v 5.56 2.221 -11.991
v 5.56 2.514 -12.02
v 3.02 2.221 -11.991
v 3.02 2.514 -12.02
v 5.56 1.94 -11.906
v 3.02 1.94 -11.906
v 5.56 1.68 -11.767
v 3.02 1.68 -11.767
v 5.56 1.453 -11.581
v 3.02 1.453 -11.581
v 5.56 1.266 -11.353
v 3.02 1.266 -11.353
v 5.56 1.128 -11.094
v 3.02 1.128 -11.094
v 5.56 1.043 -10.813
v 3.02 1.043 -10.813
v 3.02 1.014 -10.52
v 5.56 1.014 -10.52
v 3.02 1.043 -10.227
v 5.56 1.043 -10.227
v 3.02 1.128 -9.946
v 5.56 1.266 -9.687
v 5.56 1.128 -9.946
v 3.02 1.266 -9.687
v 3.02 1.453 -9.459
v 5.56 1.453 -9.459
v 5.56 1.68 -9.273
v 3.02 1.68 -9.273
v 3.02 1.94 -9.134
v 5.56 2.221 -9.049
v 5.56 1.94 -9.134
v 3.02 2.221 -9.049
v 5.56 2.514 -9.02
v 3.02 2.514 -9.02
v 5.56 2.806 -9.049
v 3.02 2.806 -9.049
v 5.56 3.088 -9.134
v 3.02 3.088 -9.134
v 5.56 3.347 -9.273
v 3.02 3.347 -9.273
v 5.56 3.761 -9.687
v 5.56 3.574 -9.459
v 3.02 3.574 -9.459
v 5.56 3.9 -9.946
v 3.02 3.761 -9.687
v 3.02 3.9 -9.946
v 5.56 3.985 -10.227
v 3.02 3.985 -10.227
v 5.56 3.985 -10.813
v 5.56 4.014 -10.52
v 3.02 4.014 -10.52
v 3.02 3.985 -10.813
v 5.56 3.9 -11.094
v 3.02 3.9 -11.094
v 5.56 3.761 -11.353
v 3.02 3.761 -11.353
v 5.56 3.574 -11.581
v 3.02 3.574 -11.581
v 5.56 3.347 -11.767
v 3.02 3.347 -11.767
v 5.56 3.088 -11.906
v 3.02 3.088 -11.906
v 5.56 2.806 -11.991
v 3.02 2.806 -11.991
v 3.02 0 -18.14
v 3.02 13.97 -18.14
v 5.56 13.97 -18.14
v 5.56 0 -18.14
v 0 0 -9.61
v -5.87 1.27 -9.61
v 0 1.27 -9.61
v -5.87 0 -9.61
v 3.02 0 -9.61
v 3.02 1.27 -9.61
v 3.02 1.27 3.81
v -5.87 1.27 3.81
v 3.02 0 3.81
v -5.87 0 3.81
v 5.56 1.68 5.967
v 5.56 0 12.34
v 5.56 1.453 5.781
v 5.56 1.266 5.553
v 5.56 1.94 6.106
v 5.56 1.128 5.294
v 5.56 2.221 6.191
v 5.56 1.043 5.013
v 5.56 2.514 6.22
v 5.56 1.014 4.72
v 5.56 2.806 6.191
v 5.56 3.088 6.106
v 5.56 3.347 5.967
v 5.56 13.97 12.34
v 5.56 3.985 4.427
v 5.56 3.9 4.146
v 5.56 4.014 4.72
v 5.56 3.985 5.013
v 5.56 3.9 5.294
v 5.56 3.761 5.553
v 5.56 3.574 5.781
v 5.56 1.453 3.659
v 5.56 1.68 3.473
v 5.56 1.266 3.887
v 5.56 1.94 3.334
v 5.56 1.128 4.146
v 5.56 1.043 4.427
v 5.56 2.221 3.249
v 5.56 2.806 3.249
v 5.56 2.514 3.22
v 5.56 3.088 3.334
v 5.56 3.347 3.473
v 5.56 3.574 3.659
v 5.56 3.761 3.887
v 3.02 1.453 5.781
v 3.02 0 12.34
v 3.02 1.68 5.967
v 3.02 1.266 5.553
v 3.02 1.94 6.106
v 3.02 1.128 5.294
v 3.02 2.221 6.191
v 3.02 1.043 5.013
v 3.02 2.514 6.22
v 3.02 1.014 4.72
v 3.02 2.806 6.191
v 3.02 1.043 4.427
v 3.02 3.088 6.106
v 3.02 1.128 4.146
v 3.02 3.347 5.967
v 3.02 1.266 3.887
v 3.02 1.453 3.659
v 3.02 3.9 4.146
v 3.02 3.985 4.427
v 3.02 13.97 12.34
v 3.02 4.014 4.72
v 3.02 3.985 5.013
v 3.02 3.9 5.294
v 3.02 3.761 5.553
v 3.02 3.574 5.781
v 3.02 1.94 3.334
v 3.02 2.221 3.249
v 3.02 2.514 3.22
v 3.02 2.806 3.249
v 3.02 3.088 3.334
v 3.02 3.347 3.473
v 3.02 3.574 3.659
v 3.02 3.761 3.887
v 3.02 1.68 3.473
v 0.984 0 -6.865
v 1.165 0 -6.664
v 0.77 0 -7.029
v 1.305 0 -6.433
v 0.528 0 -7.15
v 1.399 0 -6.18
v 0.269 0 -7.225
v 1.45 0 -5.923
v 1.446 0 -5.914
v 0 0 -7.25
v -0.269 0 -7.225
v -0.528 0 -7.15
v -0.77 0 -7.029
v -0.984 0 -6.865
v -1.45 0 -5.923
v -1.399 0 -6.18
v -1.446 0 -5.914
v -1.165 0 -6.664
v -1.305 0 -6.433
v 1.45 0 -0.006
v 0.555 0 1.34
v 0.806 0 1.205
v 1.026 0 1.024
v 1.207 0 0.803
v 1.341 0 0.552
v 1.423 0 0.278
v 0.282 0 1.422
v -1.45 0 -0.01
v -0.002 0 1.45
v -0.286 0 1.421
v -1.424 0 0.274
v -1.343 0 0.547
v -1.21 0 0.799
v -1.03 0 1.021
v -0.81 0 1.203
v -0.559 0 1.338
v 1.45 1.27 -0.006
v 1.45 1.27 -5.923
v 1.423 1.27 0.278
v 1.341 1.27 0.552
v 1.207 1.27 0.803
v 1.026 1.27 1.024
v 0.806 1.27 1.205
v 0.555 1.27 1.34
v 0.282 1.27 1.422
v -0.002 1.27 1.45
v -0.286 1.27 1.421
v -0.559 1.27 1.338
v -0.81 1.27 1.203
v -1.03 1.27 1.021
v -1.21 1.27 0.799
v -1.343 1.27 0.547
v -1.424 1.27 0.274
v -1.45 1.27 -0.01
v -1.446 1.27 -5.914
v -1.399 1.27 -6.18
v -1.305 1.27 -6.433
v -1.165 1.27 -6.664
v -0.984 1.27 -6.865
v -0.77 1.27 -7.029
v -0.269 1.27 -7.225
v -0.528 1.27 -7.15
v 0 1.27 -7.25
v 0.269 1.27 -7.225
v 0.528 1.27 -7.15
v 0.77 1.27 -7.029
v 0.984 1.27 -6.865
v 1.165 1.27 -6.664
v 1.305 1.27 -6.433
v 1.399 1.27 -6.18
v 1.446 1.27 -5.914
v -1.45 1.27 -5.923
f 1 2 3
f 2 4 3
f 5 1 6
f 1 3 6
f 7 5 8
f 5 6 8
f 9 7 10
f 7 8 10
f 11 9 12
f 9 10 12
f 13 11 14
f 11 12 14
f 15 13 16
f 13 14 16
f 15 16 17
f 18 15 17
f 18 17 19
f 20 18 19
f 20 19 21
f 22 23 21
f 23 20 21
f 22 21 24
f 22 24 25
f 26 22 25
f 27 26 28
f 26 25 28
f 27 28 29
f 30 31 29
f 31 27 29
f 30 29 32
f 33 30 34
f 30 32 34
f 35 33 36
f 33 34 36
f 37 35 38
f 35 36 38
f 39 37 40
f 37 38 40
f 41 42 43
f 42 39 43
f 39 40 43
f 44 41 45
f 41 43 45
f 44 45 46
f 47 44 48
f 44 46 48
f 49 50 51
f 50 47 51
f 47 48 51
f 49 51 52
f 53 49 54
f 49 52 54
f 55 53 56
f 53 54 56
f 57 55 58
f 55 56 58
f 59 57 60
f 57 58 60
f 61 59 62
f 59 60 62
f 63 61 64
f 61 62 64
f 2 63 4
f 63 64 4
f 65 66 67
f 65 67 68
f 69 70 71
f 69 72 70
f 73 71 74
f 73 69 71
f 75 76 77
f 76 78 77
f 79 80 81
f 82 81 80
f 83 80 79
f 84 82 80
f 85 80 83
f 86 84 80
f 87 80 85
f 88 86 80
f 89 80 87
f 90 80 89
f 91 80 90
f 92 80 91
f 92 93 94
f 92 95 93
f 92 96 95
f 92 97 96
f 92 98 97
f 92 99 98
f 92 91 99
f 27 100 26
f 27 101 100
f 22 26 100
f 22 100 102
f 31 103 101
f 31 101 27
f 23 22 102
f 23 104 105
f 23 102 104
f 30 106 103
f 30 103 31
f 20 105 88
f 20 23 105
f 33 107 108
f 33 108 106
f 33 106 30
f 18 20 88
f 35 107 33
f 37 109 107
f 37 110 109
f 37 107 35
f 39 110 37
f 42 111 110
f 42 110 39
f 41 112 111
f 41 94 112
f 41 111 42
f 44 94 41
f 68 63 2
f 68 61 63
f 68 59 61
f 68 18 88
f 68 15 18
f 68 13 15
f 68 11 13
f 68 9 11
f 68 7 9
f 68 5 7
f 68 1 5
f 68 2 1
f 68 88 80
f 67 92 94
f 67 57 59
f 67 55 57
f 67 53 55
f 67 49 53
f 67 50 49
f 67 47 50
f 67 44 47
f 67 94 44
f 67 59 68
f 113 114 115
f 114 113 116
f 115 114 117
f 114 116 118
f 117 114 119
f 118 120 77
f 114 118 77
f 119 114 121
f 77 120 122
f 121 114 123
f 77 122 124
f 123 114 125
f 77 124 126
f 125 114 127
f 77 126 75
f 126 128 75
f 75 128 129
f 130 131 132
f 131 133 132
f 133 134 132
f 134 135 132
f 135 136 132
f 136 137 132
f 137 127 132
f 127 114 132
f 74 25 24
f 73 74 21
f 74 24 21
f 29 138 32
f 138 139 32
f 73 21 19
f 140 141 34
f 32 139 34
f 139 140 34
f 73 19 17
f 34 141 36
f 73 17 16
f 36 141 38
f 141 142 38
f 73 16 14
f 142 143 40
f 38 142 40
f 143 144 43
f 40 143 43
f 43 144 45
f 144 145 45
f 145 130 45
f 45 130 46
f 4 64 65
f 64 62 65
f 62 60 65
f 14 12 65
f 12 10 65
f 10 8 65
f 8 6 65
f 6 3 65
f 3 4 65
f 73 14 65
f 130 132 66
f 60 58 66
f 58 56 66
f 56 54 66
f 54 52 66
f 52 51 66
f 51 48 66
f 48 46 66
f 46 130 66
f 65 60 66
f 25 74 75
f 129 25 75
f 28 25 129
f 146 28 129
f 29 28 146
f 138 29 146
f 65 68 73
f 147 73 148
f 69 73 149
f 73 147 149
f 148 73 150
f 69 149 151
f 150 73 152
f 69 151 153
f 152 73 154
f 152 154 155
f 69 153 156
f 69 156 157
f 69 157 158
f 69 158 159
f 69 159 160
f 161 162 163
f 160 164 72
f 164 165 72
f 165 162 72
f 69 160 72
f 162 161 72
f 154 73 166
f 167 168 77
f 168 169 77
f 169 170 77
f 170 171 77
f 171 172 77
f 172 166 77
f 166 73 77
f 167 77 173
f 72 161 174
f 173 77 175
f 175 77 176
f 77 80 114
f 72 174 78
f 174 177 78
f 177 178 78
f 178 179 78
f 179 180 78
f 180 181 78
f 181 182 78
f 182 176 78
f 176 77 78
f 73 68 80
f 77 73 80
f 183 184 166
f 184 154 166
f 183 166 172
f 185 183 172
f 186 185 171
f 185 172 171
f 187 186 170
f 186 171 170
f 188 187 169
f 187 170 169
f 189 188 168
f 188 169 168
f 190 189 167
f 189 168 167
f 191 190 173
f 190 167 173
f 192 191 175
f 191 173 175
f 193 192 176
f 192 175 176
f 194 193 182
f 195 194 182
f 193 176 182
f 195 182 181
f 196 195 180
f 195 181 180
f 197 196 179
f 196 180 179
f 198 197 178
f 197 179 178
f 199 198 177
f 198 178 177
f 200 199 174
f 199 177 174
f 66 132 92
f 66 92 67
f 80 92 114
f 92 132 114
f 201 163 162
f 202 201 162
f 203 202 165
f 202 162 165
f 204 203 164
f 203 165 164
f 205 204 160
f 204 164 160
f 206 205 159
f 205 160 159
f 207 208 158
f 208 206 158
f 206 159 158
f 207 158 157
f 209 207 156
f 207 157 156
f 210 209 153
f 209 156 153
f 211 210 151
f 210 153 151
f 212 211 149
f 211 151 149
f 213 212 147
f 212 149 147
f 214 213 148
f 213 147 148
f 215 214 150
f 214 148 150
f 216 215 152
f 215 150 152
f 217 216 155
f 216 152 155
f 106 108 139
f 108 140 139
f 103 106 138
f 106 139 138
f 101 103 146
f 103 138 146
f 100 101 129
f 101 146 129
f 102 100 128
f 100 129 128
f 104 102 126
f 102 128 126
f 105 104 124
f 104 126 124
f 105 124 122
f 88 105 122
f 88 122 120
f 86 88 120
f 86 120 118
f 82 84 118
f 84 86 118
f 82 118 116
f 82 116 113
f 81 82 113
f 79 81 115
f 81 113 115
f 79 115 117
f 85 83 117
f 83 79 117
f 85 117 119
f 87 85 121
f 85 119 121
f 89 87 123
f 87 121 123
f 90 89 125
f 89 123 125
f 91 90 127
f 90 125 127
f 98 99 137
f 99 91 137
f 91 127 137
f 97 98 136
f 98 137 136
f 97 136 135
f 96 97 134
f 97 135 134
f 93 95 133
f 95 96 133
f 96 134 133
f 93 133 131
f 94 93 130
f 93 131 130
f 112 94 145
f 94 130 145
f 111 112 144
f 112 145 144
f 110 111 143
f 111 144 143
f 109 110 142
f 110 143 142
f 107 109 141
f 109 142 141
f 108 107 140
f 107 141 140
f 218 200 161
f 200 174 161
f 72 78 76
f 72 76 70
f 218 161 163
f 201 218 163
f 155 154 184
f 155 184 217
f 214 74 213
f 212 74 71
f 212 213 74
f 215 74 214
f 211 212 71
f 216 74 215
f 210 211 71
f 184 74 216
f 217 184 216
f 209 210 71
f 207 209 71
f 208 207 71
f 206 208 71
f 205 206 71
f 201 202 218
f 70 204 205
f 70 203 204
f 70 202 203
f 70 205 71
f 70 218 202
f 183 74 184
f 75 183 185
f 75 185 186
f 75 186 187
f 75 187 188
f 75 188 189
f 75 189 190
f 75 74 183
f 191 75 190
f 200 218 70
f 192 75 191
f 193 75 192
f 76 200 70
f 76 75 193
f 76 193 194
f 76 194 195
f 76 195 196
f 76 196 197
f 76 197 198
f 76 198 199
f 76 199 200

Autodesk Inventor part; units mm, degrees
ref_plane "YZ Plane" through (0, 0, 0) normal (1, 0, 0) x (0, 1, 0)
ref_plane "XZ Plane" through (0, 0, 0) normal (0, 1, 0) x (-1, 0, 0)
ref_plane "XY Plane" through (0, 0, 0) normal (0, 0, 1) x (1, 0, 0)
sketch "Sketch1" plane through (0, 0, 0) normal (0, 1, 0) x (-1, 0, 0)
  circle A0 centre (0, -5.8) radius 1.45
  circle A1 centre (0, 0) radius 1.45
  line L0 (-1.45, -5.923) -> (-1.45, 0.123)
  line L1 (1.45, 0.123) -> (1.45, -5.923)
  circle A2 centre (0, -5.8) radius 1.45
  circle A3 centre (0, 0) radius 1.45
  line L2 (-1.45, -5.923) -> (-1.45, 0.123)
  line L3 (1.45, -5.923) -> (1.45, 0.123)
  line L4 (-1.45, -5.923) -> (1.45, -0.0104)
  line L5 (1.45, -5.923) -> (-1.45, -0.0056)
  line L6 (5.87, 3.81) -> (-3.02, 3.81)
  line L7 (-3.02, 3.81) -> (-3.02, -9.3582)
  line L8 (5.87, -9.3582) -> (5.87, 3.81)
  line L9 (0, -5.8) -> (0, -9.61)
  line L10 (5.87, -9.3582) -> (5.87, -9.61)
  line L11 (5.87, -9.61) -> (0, -9.61)
  line L12 (-3.02, -9.61) -> (-3.02, -9.3582)
  line L13 (0, -9.61) -> (-3.02, -9.61)
  point P0 (3.8566, 2.9938)
  point P1 (-1.4456, -5.9139)
  point P2 (-1.45, -5.8099)
  point P3 (-1.45, -5.7901)
  point P4 (-1.45, -0.0056)
  point P5 (1.45, -0.0104)
  point P6 (1.45, -5.7873)
  point P7 (1.45, -5.8126)
  point P8 (1.4456, -5.9139)
  dimension "d4" = 0
  dimension "d5" = 2.9
  dimension "d6" = 2.9001
  dimension "d8" = 1.57
  dimension "d9" = 8.89
  dimension "d11" = 3.81
  dimension "d13" = 3.81
extrude "Extrusion1" add sketch "Sketch1" along normal blind 1.27
sketch "Sketch2" plane through (3.02, 0, 3.81) normal (1, 0, 0) x (0, 0, -1)
  line L0 (9.6001, 1.27) -> (3.8156, 1.27) projected
  line L1 (3.8204, 1.27) -> (9.5973, 1.27) projected
  line L2 (2.36, 1.27) -> (3.8204, 1.27) projected
  line L3 (9.7239, 1.27) -> (11.06, 1.27) projected
  line L4 (6.71, 0) -> (6.71, 13.97)
  line L5 (6.71, 13.97) -> (21.95, 13.97)
  line L6 (21.95, 13.97) -> (21.95, 0)
  line L7 (21.95, 0) -> (6.71, 0)
  line L8 (6.71, 0) -> (6.71, 13.97)
  line L9 (6.71, 13.97) -> (-8.53, 13.97)
  line L10 (-8.53, 13.97) -> (-8.53, 0)
  line L11 (-8.53, 0) -> (6.71, 0)
  line L12 (6.71, 0) -> (6.71, 13.97)
  line L13 (0, 0) -> (13.42, 0) projected
  line L14 (13.42, 0) -> (13.42, 1.27) projected
  line L15 (0, 1.27) -> (13.42, 1.27) projected
  line L16 (0, 0) -> (0, 1.27) projected
  circle A0 centre (14.33, 2.5137) radius 1.5
  circle A1 centre (-0.91, 2.5137) radius 1.5
  point P0 (3.81, 0)
  point P1 (9.7239, 1.27)
  dimension "d19" = 15.24
  dimension "d20" = 15.24
  dimension "d21" = 7.62
  dimension "d22" = 7.62
  dimension "d23" = 3
  dimension "d24" = 3
extrude "Extrusion2" add sketch "Sketch2" along normal blind 2.54
properties part number "USB_MOUNT"
